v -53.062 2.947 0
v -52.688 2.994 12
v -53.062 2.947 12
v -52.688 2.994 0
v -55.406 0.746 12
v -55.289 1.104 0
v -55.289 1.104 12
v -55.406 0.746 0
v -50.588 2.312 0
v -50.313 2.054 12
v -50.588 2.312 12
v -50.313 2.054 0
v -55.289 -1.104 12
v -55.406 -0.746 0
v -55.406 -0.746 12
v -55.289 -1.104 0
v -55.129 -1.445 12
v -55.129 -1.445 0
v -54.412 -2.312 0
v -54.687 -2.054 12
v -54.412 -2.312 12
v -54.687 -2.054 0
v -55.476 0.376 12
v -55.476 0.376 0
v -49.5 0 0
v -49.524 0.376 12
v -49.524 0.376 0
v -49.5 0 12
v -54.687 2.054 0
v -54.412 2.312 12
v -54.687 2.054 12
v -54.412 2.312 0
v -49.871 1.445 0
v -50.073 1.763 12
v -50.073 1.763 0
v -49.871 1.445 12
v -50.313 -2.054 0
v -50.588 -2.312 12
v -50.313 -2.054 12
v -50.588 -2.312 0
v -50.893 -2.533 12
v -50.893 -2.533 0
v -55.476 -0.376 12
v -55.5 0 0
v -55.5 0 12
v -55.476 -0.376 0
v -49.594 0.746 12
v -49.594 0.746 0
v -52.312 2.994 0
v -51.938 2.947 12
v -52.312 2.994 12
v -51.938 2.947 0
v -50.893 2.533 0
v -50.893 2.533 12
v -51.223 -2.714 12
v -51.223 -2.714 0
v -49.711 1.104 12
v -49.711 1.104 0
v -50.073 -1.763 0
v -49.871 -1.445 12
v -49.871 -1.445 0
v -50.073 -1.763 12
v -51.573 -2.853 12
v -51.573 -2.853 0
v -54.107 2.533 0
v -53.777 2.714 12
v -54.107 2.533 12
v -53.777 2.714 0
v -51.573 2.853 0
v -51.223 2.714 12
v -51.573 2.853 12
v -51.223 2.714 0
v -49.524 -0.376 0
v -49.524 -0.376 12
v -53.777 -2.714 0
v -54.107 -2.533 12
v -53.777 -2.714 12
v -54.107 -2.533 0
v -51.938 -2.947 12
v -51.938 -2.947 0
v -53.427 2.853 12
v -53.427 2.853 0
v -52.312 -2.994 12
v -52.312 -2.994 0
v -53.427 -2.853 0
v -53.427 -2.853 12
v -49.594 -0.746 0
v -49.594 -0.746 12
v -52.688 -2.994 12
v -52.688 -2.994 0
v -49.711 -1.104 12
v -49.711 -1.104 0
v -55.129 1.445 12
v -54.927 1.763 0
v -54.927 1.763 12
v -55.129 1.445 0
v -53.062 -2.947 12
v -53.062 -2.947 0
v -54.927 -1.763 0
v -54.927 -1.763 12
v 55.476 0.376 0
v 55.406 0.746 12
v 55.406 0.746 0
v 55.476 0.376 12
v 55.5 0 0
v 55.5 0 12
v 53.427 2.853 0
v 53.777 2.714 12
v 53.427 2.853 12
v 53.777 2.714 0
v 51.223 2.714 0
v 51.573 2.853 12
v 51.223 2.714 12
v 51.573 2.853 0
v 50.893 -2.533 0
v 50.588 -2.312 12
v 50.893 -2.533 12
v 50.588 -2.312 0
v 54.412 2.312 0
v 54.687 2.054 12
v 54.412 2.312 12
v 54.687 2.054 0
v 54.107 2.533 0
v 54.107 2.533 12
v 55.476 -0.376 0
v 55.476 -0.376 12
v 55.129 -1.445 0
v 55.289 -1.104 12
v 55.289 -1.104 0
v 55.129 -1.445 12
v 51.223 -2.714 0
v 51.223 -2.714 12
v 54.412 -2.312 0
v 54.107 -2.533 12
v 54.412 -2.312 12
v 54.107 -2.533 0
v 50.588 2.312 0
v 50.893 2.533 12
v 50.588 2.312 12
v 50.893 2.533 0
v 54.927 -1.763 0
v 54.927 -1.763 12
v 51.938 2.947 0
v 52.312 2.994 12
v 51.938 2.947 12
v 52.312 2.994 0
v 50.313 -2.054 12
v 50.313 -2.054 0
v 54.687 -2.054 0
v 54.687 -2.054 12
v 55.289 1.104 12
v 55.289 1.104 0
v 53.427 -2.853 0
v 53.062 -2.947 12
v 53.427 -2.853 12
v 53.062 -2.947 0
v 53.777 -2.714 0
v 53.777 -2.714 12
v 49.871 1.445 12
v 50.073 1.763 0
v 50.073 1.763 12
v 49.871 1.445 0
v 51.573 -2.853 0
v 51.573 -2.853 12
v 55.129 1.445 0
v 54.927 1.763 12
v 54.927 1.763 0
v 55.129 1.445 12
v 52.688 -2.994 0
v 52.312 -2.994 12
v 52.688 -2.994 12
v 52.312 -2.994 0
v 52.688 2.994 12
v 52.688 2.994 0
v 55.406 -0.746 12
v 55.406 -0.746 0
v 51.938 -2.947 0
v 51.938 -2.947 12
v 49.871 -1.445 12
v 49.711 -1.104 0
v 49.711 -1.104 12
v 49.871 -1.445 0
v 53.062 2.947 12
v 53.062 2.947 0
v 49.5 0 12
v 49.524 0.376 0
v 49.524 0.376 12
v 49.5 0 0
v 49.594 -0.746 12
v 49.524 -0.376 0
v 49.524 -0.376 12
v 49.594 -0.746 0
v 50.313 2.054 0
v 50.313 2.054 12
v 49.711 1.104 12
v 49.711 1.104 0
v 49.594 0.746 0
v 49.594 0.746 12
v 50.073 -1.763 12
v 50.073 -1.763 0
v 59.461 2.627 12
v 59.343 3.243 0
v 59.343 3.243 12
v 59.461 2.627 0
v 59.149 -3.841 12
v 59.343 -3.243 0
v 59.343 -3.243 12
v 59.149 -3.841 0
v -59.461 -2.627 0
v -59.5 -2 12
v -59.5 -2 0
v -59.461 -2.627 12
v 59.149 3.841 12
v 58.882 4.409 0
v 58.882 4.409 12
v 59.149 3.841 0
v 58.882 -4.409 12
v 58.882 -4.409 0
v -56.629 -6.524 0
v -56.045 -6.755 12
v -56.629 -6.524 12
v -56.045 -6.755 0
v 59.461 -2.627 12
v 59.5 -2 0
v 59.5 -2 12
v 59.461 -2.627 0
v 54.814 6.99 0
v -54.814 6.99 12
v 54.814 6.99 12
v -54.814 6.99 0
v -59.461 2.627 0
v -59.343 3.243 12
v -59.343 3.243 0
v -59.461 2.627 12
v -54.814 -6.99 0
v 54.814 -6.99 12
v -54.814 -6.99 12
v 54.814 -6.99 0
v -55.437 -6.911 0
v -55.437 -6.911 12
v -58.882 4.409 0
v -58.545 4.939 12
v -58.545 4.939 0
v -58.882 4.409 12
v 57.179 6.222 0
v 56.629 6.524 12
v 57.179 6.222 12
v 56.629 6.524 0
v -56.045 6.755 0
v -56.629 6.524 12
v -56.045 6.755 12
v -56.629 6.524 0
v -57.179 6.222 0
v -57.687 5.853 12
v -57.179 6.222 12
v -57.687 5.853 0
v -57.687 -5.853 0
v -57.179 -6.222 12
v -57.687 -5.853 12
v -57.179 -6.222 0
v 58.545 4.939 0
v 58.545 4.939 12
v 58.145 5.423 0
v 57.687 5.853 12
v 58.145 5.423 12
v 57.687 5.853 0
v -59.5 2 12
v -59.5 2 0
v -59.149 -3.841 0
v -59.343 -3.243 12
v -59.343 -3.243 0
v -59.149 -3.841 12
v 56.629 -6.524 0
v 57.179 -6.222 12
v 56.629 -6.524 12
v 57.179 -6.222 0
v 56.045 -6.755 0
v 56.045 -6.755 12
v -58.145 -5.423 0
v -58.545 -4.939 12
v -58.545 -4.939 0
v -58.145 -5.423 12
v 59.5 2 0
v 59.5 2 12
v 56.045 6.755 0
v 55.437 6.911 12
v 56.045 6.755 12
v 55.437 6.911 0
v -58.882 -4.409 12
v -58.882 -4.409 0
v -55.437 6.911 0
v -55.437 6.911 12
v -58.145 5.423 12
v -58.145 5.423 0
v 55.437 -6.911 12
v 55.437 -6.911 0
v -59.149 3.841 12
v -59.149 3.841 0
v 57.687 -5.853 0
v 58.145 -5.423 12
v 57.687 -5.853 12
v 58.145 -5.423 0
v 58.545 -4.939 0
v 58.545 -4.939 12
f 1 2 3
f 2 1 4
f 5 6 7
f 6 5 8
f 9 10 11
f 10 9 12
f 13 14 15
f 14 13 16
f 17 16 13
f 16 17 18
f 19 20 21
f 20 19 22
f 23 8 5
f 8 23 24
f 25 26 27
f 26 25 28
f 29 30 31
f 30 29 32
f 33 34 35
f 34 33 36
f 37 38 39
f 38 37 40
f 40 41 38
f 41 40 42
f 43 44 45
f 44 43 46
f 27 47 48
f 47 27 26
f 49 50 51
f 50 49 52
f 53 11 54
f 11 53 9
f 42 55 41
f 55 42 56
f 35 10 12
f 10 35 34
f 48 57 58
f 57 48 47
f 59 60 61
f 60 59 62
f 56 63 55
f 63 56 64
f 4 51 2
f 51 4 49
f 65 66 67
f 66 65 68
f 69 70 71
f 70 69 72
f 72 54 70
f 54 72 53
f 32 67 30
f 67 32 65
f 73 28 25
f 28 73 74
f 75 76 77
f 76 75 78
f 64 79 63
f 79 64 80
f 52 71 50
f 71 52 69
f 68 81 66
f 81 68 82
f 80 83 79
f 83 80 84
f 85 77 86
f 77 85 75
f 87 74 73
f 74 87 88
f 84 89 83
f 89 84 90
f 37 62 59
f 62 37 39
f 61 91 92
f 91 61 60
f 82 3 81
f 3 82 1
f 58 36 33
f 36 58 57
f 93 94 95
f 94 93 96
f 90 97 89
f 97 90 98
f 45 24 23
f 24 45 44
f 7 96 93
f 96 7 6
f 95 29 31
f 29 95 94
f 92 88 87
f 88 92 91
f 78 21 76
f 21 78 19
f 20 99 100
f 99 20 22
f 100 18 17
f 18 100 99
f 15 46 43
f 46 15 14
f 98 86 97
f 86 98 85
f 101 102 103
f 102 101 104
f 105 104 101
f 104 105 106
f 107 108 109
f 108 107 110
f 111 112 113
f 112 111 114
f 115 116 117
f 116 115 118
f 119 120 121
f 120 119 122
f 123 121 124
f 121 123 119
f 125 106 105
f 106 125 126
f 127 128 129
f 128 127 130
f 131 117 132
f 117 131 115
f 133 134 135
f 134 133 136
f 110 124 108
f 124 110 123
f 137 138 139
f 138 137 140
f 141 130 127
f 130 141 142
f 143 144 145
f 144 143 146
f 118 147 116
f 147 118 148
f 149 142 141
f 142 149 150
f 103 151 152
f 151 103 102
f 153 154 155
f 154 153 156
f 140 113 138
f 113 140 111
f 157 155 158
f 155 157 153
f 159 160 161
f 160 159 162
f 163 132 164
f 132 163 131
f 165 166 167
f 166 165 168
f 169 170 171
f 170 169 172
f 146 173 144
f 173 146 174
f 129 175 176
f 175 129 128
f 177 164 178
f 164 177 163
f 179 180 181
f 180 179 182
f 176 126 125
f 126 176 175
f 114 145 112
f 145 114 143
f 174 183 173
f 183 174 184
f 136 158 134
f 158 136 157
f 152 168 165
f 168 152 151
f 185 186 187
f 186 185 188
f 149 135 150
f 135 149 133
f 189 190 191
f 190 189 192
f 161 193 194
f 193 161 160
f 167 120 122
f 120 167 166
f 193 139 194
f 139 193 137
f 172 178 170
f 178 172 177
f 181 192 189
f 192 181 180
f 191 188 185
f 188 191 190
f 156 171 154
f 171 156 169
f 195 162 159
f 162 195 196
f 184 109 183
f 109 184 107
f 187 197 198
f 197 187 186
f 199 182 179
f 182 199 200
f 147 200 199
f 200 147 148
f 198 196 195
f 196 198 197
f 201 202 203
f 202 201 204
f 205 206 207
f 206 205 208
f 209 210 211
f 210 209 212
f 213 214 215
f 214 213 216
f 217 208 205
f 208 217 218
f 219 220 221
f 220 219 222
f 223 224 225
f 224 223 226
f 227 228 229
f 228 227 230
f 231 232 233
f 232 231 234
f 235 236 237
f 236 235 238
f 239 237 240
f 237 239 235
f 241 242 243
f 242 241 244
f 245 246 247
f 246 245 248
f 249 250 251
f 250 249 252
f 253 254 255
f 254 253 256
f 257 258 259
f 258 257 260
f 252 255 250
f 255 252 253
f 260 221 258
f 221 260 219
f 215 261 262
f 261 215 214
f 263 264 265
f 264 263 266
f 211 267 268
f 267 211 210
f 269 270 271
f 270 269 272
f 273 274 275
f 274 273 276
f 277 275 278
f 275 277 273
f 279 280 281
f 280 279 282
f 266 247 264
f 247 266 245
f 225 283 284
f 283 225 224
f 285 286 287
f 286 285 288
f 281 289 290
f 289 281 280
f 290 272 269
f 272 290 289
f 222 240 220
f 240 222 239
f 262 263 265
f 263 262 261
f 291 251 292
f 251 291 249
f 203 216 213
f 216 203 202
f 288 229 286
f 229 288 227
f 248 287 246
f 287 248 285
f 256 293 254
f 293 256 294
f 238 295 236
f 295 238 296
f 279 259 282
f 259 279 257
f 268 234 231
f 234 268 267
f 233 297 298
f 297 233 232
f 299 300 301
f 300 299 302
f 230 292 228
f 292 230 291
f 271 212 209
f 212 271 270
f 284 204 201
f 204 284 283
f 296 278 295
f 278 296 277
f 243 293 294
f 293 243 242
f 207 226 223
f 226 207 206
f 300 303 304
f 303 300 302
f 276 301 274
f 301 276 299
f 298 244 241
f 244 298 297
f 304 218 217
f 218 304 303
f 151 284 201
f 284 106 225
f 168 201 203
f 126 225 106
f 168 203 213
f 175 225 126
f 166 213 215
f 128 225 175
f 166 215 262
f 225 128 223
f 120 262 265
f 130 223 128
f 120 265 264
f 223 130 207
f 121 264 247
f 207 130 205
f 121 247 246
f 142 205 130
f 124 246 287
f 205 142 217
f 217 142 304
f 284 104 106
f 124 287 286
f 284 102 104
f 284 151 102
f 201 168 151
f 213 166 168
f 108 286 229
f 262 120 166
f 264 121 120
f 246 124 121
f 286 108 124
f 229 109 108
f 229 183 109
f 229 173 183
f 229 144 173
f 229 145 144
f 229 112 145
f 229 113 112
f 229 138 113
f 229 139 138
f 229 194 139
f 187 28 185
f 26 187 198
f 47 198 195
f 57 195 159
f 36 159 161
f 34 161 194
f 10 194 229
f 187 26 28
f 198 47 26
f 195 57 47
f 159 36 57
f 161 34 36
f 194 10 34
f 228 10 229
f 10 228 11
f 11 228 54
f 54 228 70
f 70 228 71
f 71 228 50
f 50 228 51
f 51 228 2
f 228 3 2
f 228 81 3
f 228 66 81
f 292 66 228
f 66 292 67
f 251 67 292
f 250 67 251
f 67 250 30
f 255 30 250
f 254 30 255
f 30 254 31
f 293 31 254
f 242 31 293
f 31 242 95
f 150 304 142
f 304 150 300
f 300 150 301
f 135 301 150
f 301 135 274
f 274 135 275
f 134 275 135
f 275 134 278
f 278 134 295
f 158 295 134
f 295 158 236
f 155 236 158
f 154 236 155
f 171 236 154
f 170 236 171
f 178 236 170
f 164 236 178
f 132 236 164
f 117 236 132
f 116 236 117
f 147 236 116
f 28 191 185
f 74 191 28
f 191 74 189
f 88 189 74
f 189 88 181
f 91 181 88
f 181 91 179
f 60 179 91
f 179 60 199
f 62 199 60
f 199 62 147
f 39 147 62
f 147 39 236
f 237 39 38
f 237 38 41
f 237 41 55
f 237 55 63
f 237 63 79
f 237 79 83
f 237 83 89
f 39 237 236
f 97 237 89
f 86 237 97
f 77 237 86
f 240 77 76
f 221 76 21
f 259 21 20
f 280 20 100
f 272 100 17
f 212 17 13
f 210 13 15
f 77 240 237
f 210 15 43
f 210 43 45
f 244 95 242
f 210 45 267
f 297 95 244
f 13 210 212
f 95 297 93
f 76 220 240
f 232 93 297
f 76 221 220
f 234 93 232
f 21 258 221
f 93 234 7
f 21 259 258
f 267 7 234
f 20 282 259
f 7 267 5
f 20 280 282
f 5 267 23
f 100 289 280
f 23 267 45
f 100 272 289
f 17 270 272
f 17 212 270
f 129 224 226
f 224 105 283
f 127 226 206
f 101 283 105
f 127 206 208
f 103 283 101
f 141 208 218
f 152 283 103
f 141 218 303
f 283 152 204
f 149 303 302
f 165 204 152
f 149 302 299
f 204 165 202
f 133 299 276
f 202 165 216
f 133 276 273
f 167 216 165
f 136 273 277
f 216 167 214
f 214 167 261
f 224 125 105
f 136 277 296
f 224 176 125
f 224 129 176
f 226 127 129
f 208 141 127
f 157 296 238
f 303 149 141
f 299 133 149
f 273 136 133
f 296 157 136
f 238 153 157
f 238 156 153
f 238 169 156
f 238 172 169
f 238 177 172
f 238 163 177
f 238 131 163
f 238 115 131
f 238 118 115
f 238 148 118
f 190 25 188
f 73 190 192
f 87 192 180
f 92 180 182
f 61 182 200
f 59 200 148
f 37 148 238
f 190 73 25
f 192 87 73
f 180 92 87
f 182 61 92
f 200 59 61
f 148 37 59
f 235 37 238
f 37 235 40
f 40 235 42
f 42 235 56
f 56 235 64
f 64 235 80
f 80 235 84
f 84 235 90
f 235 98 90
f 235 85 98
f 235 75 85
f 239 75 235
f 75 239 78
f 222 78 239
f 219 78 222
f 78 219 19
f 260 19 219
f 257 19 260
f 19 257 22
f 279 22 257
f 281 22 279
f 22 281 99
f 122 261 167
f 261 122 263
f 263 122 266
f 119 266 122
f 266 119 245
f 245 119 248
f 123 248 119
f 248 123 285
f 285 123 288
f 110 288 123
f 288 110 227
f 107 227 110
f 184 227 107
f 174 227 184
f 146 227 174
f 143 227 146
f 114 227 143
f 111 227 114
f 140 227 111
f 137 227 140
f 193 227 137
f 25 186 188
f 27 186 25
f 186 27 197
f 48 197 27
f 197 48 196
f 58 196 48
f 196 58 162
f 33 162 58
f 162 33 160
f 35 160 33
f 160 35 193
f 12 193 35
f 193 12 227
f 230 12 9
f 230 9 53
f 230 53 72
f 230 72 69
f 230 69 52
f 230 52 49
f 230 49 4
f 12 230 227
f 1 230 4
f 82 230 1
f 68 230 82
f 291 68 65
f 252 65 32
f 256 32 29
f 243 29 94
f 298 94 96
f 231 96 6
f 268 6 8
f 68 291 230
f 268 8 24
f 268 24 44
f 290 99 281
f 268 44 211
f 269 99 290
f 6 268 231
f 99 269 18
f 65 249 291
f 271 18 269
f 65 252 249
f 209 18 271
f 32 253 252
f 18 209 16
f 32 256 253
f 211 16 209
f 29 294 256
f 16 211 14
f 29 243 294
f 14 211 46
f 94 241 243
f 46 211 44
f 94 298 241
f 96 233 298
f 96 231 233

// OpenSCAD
$fn = 50;


difference() {
	union() {
		hull() {
			translate(v = [-54.5000000000, 2.0000000000, 0]) {
				cylinder(h = 12, r = 5);
			}
			translate(v = [54.5000000000, 2.0000000000, 0]) {
				cylinder(h = 12, r = 5);
			}
			translate(v = [-54.5000000000, -2.0000000000, 0]) {
				cylinder(h = 12, r = 5);
			}
			translate(v = [54.5000000000, -2.0000000000, 0]) {
				cylinder(h = 12, r = 5);
			}
		}
	}
	union() {
		translate(v = [-52.5000000000, 0.0000000000, -100.0000000000]) {
			cylinder(h = 200, r = 3.0000000000);
		}
		translate(v = [-52.5000000000, 0.0000000000, -100.0000000000]) {
			cylinder(h = 200, r = 3.0000000000);
		}
		translate(v = [52.5000000000, 0.0000000000, -100.0000000000]) {
			cylinder(h = 200, r = 3.0000000000);
		}
		translate(v = [52.5000000000, 0.0000000000, -100.0000000000]) {
			cylinder(h = 200, r = 3.0000000000);
		}
	}
}
